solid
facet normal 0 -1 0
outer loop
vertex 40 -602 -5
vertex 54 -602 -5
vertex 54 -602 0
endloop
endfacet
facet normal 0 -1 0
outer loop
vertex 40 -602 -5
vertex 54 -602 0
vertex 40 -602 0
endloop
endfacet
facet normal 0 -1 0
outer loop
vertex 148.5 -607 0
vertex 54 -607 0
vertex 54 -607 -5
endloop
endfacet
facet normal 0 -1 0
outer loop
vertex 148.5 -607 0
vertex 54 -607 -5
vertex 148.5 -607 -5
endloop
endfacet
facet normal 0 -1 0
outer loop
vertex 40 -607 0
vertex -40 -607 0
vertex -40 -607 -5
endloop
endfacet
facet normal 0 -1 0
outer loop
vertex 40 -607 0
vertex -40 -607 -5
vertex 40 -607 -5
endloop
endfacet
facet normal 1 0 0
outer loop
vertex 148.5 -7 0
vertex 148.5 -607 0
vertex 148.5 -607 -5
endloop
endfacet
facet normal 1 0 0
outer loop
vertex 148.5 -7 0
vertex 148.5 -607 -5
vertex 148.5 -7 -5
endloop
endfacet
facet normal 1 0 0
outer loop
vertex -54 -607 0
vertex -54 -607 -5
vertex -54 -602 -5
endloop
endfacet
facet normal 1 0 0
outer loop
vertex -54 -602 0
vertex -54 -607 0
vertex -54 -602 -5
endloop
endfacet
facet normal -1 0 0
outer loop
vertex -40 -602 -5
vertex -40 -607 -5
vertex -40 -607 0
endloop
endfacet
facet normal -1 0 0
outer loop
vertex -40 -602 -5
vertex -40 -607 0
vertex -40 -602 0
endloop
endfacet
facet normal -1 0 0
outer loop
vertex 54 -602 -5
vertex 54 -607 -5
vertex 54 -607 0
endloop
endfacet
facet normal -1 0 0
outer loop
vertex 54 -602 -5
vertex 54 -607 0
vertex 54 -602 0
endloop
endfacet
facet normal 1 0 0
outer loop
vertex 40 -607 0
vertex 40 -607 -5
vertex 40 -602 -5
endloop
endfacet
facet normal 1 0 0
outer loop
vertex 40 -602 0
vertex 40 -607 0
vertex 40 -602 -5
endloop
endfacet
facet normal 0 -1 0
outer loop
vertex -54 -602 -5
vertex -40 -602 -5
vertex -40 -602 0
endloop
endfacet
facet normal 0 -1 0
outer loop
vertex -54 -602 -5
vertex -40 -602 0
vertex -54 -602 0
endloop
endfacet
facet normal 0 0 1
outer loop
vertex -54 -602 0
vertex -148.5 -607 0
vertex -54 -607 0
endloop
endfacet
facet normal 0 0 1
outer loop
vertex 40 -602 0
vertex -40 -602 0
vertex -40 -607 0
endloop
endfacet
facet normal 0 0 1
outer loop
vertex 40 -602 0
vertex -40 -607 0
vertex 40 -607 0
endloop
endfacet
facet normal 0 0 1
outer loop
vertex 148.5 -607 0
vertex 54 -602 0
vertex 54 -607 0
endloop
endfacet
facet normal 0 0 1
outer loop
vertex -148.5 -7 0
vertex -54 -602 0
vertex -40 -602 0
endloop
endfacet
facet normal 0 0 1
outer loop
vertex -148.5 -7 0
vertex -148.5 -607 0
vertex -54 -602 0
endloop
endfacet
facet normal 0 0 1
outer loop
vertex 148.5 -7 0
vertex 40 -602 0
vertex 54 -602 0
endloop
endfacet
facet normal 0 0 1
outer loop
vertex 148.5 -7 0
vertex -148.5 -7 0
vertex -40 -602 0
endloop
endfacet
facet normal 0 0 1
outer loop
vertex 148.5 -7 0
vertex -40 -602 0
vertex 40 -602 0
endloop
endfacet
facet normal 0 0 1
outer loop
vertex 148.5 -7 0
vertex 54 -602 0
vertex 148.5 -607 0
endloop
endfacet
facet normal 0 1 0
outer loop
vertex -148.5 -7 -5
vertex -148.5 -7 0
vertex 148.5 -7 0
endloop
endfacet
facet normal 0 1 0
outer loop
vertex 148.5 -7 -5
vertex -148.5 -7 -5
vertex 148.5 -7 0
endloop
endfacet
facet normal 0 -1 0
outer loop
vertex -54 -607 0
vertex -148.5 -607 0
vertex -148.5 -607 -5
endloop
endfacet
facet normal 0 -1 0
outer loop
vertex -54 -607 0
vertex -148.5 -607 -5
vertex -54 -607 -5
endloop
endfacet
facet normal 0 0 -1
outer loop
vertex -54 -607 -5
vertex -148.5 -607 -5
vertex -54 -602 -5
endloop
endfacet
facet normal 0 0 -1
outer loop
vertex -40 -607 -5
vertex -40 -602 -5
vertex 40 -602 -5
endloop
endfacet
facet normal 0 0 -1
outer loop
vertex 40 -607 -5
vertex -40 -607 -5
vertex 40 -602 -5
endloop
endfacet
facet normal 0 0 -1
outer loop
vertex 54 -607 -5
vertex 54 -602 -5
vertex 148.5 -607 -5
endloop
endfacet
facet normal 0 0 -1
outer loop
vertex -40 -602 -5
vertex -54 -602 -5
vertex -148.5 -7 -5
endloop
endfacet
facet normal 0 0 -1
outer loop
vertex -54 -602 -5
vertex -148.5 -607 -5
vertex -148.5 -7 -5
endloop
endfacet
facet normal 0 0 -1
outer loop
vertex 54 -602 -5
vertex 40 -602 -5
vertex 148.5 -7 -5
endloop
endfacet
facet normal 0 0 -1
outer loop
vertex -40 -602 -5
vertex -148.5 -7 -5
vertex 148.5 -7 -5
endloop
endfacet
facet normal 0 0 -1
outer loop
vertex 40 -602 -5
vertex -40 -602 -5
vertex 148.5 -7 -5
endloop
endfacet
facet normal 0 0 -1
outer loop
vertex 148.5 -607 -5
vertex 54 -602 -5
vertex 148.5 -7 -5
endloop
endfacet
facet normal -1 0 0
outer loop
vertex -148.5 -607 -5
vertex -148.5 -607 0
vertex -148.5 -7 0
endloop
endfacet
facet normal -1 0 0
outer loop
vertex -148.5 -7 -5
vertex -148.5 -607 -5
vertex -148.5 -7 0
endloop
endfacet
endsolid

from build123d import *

# Parameters (mm, degrees)
SKETCH1_W          = 297
SKETCH1_H          = 600
EXTRUDE1_DEPTH     = 5
CUT_EXTRUDE1_REACH = 626.921
SKETCH2_W          = 14
SKETCH2_H          = 5


with BuildPart() as part:
    # Sketch1 → Extrude1 (new body)
    with BuildSketch(Plane.XY):
        with Locations((0, -307)):
            Rectangle(SKETCH1_W, SKETCH1_H)
    extrude(amount=-EXTRUDE1_DEPTH)

    # Sketch2 → Cut-Extrude1 (cut, up to next)
    with BuildSketch(Plane(origin=(0, 0, -5), x_dir=(-1, 0, 0), z_dir=(0, 0, -1)), mode=Mode.PRIVATE) as cut_extrude1_sk1:
        with Locations((-47, -604.5)):
            Rectangle(SKETCH2_W, SKETCH2_H)
    cut_extrude1_tool1 = extrude(cut_extrude1_sk1.sketch, amount=-CUT_EXTRUDE1_REACH, mode=Mode.PRIVATE) & part.part
    # Sketch2 → Cut-Extrude1 (cut, up to next)
    with BuildSketch(Plane(origin=(0, 0, -5), x_dir=(-1, 0, 0), z_dir=(0, 0, -1)), mode=Mode.PRIVATE) as cut_extrude1_sk2:
        with Locations((47, -604.5)):
            Rectangle(SKETCH2_W, SKETCH2_H)
    cut_extrude1_tool2 = extrude(cut_extrude1_sk2.sketch, amount=-CUT_EXTRUDE1_REACH, mode=Mode.PRIVATE) & part.part
    add(cut_extrude1_tool1.solids().sort_by_distance((47, -604.5, -5))[0], mode=Mode.SUBTRACT)
    add(cut_extrude1_tool2.solids().sort_by_distance((-47, -604.5, -5))[0], mode=Mode.SUBTRACT)


solid = part.part
